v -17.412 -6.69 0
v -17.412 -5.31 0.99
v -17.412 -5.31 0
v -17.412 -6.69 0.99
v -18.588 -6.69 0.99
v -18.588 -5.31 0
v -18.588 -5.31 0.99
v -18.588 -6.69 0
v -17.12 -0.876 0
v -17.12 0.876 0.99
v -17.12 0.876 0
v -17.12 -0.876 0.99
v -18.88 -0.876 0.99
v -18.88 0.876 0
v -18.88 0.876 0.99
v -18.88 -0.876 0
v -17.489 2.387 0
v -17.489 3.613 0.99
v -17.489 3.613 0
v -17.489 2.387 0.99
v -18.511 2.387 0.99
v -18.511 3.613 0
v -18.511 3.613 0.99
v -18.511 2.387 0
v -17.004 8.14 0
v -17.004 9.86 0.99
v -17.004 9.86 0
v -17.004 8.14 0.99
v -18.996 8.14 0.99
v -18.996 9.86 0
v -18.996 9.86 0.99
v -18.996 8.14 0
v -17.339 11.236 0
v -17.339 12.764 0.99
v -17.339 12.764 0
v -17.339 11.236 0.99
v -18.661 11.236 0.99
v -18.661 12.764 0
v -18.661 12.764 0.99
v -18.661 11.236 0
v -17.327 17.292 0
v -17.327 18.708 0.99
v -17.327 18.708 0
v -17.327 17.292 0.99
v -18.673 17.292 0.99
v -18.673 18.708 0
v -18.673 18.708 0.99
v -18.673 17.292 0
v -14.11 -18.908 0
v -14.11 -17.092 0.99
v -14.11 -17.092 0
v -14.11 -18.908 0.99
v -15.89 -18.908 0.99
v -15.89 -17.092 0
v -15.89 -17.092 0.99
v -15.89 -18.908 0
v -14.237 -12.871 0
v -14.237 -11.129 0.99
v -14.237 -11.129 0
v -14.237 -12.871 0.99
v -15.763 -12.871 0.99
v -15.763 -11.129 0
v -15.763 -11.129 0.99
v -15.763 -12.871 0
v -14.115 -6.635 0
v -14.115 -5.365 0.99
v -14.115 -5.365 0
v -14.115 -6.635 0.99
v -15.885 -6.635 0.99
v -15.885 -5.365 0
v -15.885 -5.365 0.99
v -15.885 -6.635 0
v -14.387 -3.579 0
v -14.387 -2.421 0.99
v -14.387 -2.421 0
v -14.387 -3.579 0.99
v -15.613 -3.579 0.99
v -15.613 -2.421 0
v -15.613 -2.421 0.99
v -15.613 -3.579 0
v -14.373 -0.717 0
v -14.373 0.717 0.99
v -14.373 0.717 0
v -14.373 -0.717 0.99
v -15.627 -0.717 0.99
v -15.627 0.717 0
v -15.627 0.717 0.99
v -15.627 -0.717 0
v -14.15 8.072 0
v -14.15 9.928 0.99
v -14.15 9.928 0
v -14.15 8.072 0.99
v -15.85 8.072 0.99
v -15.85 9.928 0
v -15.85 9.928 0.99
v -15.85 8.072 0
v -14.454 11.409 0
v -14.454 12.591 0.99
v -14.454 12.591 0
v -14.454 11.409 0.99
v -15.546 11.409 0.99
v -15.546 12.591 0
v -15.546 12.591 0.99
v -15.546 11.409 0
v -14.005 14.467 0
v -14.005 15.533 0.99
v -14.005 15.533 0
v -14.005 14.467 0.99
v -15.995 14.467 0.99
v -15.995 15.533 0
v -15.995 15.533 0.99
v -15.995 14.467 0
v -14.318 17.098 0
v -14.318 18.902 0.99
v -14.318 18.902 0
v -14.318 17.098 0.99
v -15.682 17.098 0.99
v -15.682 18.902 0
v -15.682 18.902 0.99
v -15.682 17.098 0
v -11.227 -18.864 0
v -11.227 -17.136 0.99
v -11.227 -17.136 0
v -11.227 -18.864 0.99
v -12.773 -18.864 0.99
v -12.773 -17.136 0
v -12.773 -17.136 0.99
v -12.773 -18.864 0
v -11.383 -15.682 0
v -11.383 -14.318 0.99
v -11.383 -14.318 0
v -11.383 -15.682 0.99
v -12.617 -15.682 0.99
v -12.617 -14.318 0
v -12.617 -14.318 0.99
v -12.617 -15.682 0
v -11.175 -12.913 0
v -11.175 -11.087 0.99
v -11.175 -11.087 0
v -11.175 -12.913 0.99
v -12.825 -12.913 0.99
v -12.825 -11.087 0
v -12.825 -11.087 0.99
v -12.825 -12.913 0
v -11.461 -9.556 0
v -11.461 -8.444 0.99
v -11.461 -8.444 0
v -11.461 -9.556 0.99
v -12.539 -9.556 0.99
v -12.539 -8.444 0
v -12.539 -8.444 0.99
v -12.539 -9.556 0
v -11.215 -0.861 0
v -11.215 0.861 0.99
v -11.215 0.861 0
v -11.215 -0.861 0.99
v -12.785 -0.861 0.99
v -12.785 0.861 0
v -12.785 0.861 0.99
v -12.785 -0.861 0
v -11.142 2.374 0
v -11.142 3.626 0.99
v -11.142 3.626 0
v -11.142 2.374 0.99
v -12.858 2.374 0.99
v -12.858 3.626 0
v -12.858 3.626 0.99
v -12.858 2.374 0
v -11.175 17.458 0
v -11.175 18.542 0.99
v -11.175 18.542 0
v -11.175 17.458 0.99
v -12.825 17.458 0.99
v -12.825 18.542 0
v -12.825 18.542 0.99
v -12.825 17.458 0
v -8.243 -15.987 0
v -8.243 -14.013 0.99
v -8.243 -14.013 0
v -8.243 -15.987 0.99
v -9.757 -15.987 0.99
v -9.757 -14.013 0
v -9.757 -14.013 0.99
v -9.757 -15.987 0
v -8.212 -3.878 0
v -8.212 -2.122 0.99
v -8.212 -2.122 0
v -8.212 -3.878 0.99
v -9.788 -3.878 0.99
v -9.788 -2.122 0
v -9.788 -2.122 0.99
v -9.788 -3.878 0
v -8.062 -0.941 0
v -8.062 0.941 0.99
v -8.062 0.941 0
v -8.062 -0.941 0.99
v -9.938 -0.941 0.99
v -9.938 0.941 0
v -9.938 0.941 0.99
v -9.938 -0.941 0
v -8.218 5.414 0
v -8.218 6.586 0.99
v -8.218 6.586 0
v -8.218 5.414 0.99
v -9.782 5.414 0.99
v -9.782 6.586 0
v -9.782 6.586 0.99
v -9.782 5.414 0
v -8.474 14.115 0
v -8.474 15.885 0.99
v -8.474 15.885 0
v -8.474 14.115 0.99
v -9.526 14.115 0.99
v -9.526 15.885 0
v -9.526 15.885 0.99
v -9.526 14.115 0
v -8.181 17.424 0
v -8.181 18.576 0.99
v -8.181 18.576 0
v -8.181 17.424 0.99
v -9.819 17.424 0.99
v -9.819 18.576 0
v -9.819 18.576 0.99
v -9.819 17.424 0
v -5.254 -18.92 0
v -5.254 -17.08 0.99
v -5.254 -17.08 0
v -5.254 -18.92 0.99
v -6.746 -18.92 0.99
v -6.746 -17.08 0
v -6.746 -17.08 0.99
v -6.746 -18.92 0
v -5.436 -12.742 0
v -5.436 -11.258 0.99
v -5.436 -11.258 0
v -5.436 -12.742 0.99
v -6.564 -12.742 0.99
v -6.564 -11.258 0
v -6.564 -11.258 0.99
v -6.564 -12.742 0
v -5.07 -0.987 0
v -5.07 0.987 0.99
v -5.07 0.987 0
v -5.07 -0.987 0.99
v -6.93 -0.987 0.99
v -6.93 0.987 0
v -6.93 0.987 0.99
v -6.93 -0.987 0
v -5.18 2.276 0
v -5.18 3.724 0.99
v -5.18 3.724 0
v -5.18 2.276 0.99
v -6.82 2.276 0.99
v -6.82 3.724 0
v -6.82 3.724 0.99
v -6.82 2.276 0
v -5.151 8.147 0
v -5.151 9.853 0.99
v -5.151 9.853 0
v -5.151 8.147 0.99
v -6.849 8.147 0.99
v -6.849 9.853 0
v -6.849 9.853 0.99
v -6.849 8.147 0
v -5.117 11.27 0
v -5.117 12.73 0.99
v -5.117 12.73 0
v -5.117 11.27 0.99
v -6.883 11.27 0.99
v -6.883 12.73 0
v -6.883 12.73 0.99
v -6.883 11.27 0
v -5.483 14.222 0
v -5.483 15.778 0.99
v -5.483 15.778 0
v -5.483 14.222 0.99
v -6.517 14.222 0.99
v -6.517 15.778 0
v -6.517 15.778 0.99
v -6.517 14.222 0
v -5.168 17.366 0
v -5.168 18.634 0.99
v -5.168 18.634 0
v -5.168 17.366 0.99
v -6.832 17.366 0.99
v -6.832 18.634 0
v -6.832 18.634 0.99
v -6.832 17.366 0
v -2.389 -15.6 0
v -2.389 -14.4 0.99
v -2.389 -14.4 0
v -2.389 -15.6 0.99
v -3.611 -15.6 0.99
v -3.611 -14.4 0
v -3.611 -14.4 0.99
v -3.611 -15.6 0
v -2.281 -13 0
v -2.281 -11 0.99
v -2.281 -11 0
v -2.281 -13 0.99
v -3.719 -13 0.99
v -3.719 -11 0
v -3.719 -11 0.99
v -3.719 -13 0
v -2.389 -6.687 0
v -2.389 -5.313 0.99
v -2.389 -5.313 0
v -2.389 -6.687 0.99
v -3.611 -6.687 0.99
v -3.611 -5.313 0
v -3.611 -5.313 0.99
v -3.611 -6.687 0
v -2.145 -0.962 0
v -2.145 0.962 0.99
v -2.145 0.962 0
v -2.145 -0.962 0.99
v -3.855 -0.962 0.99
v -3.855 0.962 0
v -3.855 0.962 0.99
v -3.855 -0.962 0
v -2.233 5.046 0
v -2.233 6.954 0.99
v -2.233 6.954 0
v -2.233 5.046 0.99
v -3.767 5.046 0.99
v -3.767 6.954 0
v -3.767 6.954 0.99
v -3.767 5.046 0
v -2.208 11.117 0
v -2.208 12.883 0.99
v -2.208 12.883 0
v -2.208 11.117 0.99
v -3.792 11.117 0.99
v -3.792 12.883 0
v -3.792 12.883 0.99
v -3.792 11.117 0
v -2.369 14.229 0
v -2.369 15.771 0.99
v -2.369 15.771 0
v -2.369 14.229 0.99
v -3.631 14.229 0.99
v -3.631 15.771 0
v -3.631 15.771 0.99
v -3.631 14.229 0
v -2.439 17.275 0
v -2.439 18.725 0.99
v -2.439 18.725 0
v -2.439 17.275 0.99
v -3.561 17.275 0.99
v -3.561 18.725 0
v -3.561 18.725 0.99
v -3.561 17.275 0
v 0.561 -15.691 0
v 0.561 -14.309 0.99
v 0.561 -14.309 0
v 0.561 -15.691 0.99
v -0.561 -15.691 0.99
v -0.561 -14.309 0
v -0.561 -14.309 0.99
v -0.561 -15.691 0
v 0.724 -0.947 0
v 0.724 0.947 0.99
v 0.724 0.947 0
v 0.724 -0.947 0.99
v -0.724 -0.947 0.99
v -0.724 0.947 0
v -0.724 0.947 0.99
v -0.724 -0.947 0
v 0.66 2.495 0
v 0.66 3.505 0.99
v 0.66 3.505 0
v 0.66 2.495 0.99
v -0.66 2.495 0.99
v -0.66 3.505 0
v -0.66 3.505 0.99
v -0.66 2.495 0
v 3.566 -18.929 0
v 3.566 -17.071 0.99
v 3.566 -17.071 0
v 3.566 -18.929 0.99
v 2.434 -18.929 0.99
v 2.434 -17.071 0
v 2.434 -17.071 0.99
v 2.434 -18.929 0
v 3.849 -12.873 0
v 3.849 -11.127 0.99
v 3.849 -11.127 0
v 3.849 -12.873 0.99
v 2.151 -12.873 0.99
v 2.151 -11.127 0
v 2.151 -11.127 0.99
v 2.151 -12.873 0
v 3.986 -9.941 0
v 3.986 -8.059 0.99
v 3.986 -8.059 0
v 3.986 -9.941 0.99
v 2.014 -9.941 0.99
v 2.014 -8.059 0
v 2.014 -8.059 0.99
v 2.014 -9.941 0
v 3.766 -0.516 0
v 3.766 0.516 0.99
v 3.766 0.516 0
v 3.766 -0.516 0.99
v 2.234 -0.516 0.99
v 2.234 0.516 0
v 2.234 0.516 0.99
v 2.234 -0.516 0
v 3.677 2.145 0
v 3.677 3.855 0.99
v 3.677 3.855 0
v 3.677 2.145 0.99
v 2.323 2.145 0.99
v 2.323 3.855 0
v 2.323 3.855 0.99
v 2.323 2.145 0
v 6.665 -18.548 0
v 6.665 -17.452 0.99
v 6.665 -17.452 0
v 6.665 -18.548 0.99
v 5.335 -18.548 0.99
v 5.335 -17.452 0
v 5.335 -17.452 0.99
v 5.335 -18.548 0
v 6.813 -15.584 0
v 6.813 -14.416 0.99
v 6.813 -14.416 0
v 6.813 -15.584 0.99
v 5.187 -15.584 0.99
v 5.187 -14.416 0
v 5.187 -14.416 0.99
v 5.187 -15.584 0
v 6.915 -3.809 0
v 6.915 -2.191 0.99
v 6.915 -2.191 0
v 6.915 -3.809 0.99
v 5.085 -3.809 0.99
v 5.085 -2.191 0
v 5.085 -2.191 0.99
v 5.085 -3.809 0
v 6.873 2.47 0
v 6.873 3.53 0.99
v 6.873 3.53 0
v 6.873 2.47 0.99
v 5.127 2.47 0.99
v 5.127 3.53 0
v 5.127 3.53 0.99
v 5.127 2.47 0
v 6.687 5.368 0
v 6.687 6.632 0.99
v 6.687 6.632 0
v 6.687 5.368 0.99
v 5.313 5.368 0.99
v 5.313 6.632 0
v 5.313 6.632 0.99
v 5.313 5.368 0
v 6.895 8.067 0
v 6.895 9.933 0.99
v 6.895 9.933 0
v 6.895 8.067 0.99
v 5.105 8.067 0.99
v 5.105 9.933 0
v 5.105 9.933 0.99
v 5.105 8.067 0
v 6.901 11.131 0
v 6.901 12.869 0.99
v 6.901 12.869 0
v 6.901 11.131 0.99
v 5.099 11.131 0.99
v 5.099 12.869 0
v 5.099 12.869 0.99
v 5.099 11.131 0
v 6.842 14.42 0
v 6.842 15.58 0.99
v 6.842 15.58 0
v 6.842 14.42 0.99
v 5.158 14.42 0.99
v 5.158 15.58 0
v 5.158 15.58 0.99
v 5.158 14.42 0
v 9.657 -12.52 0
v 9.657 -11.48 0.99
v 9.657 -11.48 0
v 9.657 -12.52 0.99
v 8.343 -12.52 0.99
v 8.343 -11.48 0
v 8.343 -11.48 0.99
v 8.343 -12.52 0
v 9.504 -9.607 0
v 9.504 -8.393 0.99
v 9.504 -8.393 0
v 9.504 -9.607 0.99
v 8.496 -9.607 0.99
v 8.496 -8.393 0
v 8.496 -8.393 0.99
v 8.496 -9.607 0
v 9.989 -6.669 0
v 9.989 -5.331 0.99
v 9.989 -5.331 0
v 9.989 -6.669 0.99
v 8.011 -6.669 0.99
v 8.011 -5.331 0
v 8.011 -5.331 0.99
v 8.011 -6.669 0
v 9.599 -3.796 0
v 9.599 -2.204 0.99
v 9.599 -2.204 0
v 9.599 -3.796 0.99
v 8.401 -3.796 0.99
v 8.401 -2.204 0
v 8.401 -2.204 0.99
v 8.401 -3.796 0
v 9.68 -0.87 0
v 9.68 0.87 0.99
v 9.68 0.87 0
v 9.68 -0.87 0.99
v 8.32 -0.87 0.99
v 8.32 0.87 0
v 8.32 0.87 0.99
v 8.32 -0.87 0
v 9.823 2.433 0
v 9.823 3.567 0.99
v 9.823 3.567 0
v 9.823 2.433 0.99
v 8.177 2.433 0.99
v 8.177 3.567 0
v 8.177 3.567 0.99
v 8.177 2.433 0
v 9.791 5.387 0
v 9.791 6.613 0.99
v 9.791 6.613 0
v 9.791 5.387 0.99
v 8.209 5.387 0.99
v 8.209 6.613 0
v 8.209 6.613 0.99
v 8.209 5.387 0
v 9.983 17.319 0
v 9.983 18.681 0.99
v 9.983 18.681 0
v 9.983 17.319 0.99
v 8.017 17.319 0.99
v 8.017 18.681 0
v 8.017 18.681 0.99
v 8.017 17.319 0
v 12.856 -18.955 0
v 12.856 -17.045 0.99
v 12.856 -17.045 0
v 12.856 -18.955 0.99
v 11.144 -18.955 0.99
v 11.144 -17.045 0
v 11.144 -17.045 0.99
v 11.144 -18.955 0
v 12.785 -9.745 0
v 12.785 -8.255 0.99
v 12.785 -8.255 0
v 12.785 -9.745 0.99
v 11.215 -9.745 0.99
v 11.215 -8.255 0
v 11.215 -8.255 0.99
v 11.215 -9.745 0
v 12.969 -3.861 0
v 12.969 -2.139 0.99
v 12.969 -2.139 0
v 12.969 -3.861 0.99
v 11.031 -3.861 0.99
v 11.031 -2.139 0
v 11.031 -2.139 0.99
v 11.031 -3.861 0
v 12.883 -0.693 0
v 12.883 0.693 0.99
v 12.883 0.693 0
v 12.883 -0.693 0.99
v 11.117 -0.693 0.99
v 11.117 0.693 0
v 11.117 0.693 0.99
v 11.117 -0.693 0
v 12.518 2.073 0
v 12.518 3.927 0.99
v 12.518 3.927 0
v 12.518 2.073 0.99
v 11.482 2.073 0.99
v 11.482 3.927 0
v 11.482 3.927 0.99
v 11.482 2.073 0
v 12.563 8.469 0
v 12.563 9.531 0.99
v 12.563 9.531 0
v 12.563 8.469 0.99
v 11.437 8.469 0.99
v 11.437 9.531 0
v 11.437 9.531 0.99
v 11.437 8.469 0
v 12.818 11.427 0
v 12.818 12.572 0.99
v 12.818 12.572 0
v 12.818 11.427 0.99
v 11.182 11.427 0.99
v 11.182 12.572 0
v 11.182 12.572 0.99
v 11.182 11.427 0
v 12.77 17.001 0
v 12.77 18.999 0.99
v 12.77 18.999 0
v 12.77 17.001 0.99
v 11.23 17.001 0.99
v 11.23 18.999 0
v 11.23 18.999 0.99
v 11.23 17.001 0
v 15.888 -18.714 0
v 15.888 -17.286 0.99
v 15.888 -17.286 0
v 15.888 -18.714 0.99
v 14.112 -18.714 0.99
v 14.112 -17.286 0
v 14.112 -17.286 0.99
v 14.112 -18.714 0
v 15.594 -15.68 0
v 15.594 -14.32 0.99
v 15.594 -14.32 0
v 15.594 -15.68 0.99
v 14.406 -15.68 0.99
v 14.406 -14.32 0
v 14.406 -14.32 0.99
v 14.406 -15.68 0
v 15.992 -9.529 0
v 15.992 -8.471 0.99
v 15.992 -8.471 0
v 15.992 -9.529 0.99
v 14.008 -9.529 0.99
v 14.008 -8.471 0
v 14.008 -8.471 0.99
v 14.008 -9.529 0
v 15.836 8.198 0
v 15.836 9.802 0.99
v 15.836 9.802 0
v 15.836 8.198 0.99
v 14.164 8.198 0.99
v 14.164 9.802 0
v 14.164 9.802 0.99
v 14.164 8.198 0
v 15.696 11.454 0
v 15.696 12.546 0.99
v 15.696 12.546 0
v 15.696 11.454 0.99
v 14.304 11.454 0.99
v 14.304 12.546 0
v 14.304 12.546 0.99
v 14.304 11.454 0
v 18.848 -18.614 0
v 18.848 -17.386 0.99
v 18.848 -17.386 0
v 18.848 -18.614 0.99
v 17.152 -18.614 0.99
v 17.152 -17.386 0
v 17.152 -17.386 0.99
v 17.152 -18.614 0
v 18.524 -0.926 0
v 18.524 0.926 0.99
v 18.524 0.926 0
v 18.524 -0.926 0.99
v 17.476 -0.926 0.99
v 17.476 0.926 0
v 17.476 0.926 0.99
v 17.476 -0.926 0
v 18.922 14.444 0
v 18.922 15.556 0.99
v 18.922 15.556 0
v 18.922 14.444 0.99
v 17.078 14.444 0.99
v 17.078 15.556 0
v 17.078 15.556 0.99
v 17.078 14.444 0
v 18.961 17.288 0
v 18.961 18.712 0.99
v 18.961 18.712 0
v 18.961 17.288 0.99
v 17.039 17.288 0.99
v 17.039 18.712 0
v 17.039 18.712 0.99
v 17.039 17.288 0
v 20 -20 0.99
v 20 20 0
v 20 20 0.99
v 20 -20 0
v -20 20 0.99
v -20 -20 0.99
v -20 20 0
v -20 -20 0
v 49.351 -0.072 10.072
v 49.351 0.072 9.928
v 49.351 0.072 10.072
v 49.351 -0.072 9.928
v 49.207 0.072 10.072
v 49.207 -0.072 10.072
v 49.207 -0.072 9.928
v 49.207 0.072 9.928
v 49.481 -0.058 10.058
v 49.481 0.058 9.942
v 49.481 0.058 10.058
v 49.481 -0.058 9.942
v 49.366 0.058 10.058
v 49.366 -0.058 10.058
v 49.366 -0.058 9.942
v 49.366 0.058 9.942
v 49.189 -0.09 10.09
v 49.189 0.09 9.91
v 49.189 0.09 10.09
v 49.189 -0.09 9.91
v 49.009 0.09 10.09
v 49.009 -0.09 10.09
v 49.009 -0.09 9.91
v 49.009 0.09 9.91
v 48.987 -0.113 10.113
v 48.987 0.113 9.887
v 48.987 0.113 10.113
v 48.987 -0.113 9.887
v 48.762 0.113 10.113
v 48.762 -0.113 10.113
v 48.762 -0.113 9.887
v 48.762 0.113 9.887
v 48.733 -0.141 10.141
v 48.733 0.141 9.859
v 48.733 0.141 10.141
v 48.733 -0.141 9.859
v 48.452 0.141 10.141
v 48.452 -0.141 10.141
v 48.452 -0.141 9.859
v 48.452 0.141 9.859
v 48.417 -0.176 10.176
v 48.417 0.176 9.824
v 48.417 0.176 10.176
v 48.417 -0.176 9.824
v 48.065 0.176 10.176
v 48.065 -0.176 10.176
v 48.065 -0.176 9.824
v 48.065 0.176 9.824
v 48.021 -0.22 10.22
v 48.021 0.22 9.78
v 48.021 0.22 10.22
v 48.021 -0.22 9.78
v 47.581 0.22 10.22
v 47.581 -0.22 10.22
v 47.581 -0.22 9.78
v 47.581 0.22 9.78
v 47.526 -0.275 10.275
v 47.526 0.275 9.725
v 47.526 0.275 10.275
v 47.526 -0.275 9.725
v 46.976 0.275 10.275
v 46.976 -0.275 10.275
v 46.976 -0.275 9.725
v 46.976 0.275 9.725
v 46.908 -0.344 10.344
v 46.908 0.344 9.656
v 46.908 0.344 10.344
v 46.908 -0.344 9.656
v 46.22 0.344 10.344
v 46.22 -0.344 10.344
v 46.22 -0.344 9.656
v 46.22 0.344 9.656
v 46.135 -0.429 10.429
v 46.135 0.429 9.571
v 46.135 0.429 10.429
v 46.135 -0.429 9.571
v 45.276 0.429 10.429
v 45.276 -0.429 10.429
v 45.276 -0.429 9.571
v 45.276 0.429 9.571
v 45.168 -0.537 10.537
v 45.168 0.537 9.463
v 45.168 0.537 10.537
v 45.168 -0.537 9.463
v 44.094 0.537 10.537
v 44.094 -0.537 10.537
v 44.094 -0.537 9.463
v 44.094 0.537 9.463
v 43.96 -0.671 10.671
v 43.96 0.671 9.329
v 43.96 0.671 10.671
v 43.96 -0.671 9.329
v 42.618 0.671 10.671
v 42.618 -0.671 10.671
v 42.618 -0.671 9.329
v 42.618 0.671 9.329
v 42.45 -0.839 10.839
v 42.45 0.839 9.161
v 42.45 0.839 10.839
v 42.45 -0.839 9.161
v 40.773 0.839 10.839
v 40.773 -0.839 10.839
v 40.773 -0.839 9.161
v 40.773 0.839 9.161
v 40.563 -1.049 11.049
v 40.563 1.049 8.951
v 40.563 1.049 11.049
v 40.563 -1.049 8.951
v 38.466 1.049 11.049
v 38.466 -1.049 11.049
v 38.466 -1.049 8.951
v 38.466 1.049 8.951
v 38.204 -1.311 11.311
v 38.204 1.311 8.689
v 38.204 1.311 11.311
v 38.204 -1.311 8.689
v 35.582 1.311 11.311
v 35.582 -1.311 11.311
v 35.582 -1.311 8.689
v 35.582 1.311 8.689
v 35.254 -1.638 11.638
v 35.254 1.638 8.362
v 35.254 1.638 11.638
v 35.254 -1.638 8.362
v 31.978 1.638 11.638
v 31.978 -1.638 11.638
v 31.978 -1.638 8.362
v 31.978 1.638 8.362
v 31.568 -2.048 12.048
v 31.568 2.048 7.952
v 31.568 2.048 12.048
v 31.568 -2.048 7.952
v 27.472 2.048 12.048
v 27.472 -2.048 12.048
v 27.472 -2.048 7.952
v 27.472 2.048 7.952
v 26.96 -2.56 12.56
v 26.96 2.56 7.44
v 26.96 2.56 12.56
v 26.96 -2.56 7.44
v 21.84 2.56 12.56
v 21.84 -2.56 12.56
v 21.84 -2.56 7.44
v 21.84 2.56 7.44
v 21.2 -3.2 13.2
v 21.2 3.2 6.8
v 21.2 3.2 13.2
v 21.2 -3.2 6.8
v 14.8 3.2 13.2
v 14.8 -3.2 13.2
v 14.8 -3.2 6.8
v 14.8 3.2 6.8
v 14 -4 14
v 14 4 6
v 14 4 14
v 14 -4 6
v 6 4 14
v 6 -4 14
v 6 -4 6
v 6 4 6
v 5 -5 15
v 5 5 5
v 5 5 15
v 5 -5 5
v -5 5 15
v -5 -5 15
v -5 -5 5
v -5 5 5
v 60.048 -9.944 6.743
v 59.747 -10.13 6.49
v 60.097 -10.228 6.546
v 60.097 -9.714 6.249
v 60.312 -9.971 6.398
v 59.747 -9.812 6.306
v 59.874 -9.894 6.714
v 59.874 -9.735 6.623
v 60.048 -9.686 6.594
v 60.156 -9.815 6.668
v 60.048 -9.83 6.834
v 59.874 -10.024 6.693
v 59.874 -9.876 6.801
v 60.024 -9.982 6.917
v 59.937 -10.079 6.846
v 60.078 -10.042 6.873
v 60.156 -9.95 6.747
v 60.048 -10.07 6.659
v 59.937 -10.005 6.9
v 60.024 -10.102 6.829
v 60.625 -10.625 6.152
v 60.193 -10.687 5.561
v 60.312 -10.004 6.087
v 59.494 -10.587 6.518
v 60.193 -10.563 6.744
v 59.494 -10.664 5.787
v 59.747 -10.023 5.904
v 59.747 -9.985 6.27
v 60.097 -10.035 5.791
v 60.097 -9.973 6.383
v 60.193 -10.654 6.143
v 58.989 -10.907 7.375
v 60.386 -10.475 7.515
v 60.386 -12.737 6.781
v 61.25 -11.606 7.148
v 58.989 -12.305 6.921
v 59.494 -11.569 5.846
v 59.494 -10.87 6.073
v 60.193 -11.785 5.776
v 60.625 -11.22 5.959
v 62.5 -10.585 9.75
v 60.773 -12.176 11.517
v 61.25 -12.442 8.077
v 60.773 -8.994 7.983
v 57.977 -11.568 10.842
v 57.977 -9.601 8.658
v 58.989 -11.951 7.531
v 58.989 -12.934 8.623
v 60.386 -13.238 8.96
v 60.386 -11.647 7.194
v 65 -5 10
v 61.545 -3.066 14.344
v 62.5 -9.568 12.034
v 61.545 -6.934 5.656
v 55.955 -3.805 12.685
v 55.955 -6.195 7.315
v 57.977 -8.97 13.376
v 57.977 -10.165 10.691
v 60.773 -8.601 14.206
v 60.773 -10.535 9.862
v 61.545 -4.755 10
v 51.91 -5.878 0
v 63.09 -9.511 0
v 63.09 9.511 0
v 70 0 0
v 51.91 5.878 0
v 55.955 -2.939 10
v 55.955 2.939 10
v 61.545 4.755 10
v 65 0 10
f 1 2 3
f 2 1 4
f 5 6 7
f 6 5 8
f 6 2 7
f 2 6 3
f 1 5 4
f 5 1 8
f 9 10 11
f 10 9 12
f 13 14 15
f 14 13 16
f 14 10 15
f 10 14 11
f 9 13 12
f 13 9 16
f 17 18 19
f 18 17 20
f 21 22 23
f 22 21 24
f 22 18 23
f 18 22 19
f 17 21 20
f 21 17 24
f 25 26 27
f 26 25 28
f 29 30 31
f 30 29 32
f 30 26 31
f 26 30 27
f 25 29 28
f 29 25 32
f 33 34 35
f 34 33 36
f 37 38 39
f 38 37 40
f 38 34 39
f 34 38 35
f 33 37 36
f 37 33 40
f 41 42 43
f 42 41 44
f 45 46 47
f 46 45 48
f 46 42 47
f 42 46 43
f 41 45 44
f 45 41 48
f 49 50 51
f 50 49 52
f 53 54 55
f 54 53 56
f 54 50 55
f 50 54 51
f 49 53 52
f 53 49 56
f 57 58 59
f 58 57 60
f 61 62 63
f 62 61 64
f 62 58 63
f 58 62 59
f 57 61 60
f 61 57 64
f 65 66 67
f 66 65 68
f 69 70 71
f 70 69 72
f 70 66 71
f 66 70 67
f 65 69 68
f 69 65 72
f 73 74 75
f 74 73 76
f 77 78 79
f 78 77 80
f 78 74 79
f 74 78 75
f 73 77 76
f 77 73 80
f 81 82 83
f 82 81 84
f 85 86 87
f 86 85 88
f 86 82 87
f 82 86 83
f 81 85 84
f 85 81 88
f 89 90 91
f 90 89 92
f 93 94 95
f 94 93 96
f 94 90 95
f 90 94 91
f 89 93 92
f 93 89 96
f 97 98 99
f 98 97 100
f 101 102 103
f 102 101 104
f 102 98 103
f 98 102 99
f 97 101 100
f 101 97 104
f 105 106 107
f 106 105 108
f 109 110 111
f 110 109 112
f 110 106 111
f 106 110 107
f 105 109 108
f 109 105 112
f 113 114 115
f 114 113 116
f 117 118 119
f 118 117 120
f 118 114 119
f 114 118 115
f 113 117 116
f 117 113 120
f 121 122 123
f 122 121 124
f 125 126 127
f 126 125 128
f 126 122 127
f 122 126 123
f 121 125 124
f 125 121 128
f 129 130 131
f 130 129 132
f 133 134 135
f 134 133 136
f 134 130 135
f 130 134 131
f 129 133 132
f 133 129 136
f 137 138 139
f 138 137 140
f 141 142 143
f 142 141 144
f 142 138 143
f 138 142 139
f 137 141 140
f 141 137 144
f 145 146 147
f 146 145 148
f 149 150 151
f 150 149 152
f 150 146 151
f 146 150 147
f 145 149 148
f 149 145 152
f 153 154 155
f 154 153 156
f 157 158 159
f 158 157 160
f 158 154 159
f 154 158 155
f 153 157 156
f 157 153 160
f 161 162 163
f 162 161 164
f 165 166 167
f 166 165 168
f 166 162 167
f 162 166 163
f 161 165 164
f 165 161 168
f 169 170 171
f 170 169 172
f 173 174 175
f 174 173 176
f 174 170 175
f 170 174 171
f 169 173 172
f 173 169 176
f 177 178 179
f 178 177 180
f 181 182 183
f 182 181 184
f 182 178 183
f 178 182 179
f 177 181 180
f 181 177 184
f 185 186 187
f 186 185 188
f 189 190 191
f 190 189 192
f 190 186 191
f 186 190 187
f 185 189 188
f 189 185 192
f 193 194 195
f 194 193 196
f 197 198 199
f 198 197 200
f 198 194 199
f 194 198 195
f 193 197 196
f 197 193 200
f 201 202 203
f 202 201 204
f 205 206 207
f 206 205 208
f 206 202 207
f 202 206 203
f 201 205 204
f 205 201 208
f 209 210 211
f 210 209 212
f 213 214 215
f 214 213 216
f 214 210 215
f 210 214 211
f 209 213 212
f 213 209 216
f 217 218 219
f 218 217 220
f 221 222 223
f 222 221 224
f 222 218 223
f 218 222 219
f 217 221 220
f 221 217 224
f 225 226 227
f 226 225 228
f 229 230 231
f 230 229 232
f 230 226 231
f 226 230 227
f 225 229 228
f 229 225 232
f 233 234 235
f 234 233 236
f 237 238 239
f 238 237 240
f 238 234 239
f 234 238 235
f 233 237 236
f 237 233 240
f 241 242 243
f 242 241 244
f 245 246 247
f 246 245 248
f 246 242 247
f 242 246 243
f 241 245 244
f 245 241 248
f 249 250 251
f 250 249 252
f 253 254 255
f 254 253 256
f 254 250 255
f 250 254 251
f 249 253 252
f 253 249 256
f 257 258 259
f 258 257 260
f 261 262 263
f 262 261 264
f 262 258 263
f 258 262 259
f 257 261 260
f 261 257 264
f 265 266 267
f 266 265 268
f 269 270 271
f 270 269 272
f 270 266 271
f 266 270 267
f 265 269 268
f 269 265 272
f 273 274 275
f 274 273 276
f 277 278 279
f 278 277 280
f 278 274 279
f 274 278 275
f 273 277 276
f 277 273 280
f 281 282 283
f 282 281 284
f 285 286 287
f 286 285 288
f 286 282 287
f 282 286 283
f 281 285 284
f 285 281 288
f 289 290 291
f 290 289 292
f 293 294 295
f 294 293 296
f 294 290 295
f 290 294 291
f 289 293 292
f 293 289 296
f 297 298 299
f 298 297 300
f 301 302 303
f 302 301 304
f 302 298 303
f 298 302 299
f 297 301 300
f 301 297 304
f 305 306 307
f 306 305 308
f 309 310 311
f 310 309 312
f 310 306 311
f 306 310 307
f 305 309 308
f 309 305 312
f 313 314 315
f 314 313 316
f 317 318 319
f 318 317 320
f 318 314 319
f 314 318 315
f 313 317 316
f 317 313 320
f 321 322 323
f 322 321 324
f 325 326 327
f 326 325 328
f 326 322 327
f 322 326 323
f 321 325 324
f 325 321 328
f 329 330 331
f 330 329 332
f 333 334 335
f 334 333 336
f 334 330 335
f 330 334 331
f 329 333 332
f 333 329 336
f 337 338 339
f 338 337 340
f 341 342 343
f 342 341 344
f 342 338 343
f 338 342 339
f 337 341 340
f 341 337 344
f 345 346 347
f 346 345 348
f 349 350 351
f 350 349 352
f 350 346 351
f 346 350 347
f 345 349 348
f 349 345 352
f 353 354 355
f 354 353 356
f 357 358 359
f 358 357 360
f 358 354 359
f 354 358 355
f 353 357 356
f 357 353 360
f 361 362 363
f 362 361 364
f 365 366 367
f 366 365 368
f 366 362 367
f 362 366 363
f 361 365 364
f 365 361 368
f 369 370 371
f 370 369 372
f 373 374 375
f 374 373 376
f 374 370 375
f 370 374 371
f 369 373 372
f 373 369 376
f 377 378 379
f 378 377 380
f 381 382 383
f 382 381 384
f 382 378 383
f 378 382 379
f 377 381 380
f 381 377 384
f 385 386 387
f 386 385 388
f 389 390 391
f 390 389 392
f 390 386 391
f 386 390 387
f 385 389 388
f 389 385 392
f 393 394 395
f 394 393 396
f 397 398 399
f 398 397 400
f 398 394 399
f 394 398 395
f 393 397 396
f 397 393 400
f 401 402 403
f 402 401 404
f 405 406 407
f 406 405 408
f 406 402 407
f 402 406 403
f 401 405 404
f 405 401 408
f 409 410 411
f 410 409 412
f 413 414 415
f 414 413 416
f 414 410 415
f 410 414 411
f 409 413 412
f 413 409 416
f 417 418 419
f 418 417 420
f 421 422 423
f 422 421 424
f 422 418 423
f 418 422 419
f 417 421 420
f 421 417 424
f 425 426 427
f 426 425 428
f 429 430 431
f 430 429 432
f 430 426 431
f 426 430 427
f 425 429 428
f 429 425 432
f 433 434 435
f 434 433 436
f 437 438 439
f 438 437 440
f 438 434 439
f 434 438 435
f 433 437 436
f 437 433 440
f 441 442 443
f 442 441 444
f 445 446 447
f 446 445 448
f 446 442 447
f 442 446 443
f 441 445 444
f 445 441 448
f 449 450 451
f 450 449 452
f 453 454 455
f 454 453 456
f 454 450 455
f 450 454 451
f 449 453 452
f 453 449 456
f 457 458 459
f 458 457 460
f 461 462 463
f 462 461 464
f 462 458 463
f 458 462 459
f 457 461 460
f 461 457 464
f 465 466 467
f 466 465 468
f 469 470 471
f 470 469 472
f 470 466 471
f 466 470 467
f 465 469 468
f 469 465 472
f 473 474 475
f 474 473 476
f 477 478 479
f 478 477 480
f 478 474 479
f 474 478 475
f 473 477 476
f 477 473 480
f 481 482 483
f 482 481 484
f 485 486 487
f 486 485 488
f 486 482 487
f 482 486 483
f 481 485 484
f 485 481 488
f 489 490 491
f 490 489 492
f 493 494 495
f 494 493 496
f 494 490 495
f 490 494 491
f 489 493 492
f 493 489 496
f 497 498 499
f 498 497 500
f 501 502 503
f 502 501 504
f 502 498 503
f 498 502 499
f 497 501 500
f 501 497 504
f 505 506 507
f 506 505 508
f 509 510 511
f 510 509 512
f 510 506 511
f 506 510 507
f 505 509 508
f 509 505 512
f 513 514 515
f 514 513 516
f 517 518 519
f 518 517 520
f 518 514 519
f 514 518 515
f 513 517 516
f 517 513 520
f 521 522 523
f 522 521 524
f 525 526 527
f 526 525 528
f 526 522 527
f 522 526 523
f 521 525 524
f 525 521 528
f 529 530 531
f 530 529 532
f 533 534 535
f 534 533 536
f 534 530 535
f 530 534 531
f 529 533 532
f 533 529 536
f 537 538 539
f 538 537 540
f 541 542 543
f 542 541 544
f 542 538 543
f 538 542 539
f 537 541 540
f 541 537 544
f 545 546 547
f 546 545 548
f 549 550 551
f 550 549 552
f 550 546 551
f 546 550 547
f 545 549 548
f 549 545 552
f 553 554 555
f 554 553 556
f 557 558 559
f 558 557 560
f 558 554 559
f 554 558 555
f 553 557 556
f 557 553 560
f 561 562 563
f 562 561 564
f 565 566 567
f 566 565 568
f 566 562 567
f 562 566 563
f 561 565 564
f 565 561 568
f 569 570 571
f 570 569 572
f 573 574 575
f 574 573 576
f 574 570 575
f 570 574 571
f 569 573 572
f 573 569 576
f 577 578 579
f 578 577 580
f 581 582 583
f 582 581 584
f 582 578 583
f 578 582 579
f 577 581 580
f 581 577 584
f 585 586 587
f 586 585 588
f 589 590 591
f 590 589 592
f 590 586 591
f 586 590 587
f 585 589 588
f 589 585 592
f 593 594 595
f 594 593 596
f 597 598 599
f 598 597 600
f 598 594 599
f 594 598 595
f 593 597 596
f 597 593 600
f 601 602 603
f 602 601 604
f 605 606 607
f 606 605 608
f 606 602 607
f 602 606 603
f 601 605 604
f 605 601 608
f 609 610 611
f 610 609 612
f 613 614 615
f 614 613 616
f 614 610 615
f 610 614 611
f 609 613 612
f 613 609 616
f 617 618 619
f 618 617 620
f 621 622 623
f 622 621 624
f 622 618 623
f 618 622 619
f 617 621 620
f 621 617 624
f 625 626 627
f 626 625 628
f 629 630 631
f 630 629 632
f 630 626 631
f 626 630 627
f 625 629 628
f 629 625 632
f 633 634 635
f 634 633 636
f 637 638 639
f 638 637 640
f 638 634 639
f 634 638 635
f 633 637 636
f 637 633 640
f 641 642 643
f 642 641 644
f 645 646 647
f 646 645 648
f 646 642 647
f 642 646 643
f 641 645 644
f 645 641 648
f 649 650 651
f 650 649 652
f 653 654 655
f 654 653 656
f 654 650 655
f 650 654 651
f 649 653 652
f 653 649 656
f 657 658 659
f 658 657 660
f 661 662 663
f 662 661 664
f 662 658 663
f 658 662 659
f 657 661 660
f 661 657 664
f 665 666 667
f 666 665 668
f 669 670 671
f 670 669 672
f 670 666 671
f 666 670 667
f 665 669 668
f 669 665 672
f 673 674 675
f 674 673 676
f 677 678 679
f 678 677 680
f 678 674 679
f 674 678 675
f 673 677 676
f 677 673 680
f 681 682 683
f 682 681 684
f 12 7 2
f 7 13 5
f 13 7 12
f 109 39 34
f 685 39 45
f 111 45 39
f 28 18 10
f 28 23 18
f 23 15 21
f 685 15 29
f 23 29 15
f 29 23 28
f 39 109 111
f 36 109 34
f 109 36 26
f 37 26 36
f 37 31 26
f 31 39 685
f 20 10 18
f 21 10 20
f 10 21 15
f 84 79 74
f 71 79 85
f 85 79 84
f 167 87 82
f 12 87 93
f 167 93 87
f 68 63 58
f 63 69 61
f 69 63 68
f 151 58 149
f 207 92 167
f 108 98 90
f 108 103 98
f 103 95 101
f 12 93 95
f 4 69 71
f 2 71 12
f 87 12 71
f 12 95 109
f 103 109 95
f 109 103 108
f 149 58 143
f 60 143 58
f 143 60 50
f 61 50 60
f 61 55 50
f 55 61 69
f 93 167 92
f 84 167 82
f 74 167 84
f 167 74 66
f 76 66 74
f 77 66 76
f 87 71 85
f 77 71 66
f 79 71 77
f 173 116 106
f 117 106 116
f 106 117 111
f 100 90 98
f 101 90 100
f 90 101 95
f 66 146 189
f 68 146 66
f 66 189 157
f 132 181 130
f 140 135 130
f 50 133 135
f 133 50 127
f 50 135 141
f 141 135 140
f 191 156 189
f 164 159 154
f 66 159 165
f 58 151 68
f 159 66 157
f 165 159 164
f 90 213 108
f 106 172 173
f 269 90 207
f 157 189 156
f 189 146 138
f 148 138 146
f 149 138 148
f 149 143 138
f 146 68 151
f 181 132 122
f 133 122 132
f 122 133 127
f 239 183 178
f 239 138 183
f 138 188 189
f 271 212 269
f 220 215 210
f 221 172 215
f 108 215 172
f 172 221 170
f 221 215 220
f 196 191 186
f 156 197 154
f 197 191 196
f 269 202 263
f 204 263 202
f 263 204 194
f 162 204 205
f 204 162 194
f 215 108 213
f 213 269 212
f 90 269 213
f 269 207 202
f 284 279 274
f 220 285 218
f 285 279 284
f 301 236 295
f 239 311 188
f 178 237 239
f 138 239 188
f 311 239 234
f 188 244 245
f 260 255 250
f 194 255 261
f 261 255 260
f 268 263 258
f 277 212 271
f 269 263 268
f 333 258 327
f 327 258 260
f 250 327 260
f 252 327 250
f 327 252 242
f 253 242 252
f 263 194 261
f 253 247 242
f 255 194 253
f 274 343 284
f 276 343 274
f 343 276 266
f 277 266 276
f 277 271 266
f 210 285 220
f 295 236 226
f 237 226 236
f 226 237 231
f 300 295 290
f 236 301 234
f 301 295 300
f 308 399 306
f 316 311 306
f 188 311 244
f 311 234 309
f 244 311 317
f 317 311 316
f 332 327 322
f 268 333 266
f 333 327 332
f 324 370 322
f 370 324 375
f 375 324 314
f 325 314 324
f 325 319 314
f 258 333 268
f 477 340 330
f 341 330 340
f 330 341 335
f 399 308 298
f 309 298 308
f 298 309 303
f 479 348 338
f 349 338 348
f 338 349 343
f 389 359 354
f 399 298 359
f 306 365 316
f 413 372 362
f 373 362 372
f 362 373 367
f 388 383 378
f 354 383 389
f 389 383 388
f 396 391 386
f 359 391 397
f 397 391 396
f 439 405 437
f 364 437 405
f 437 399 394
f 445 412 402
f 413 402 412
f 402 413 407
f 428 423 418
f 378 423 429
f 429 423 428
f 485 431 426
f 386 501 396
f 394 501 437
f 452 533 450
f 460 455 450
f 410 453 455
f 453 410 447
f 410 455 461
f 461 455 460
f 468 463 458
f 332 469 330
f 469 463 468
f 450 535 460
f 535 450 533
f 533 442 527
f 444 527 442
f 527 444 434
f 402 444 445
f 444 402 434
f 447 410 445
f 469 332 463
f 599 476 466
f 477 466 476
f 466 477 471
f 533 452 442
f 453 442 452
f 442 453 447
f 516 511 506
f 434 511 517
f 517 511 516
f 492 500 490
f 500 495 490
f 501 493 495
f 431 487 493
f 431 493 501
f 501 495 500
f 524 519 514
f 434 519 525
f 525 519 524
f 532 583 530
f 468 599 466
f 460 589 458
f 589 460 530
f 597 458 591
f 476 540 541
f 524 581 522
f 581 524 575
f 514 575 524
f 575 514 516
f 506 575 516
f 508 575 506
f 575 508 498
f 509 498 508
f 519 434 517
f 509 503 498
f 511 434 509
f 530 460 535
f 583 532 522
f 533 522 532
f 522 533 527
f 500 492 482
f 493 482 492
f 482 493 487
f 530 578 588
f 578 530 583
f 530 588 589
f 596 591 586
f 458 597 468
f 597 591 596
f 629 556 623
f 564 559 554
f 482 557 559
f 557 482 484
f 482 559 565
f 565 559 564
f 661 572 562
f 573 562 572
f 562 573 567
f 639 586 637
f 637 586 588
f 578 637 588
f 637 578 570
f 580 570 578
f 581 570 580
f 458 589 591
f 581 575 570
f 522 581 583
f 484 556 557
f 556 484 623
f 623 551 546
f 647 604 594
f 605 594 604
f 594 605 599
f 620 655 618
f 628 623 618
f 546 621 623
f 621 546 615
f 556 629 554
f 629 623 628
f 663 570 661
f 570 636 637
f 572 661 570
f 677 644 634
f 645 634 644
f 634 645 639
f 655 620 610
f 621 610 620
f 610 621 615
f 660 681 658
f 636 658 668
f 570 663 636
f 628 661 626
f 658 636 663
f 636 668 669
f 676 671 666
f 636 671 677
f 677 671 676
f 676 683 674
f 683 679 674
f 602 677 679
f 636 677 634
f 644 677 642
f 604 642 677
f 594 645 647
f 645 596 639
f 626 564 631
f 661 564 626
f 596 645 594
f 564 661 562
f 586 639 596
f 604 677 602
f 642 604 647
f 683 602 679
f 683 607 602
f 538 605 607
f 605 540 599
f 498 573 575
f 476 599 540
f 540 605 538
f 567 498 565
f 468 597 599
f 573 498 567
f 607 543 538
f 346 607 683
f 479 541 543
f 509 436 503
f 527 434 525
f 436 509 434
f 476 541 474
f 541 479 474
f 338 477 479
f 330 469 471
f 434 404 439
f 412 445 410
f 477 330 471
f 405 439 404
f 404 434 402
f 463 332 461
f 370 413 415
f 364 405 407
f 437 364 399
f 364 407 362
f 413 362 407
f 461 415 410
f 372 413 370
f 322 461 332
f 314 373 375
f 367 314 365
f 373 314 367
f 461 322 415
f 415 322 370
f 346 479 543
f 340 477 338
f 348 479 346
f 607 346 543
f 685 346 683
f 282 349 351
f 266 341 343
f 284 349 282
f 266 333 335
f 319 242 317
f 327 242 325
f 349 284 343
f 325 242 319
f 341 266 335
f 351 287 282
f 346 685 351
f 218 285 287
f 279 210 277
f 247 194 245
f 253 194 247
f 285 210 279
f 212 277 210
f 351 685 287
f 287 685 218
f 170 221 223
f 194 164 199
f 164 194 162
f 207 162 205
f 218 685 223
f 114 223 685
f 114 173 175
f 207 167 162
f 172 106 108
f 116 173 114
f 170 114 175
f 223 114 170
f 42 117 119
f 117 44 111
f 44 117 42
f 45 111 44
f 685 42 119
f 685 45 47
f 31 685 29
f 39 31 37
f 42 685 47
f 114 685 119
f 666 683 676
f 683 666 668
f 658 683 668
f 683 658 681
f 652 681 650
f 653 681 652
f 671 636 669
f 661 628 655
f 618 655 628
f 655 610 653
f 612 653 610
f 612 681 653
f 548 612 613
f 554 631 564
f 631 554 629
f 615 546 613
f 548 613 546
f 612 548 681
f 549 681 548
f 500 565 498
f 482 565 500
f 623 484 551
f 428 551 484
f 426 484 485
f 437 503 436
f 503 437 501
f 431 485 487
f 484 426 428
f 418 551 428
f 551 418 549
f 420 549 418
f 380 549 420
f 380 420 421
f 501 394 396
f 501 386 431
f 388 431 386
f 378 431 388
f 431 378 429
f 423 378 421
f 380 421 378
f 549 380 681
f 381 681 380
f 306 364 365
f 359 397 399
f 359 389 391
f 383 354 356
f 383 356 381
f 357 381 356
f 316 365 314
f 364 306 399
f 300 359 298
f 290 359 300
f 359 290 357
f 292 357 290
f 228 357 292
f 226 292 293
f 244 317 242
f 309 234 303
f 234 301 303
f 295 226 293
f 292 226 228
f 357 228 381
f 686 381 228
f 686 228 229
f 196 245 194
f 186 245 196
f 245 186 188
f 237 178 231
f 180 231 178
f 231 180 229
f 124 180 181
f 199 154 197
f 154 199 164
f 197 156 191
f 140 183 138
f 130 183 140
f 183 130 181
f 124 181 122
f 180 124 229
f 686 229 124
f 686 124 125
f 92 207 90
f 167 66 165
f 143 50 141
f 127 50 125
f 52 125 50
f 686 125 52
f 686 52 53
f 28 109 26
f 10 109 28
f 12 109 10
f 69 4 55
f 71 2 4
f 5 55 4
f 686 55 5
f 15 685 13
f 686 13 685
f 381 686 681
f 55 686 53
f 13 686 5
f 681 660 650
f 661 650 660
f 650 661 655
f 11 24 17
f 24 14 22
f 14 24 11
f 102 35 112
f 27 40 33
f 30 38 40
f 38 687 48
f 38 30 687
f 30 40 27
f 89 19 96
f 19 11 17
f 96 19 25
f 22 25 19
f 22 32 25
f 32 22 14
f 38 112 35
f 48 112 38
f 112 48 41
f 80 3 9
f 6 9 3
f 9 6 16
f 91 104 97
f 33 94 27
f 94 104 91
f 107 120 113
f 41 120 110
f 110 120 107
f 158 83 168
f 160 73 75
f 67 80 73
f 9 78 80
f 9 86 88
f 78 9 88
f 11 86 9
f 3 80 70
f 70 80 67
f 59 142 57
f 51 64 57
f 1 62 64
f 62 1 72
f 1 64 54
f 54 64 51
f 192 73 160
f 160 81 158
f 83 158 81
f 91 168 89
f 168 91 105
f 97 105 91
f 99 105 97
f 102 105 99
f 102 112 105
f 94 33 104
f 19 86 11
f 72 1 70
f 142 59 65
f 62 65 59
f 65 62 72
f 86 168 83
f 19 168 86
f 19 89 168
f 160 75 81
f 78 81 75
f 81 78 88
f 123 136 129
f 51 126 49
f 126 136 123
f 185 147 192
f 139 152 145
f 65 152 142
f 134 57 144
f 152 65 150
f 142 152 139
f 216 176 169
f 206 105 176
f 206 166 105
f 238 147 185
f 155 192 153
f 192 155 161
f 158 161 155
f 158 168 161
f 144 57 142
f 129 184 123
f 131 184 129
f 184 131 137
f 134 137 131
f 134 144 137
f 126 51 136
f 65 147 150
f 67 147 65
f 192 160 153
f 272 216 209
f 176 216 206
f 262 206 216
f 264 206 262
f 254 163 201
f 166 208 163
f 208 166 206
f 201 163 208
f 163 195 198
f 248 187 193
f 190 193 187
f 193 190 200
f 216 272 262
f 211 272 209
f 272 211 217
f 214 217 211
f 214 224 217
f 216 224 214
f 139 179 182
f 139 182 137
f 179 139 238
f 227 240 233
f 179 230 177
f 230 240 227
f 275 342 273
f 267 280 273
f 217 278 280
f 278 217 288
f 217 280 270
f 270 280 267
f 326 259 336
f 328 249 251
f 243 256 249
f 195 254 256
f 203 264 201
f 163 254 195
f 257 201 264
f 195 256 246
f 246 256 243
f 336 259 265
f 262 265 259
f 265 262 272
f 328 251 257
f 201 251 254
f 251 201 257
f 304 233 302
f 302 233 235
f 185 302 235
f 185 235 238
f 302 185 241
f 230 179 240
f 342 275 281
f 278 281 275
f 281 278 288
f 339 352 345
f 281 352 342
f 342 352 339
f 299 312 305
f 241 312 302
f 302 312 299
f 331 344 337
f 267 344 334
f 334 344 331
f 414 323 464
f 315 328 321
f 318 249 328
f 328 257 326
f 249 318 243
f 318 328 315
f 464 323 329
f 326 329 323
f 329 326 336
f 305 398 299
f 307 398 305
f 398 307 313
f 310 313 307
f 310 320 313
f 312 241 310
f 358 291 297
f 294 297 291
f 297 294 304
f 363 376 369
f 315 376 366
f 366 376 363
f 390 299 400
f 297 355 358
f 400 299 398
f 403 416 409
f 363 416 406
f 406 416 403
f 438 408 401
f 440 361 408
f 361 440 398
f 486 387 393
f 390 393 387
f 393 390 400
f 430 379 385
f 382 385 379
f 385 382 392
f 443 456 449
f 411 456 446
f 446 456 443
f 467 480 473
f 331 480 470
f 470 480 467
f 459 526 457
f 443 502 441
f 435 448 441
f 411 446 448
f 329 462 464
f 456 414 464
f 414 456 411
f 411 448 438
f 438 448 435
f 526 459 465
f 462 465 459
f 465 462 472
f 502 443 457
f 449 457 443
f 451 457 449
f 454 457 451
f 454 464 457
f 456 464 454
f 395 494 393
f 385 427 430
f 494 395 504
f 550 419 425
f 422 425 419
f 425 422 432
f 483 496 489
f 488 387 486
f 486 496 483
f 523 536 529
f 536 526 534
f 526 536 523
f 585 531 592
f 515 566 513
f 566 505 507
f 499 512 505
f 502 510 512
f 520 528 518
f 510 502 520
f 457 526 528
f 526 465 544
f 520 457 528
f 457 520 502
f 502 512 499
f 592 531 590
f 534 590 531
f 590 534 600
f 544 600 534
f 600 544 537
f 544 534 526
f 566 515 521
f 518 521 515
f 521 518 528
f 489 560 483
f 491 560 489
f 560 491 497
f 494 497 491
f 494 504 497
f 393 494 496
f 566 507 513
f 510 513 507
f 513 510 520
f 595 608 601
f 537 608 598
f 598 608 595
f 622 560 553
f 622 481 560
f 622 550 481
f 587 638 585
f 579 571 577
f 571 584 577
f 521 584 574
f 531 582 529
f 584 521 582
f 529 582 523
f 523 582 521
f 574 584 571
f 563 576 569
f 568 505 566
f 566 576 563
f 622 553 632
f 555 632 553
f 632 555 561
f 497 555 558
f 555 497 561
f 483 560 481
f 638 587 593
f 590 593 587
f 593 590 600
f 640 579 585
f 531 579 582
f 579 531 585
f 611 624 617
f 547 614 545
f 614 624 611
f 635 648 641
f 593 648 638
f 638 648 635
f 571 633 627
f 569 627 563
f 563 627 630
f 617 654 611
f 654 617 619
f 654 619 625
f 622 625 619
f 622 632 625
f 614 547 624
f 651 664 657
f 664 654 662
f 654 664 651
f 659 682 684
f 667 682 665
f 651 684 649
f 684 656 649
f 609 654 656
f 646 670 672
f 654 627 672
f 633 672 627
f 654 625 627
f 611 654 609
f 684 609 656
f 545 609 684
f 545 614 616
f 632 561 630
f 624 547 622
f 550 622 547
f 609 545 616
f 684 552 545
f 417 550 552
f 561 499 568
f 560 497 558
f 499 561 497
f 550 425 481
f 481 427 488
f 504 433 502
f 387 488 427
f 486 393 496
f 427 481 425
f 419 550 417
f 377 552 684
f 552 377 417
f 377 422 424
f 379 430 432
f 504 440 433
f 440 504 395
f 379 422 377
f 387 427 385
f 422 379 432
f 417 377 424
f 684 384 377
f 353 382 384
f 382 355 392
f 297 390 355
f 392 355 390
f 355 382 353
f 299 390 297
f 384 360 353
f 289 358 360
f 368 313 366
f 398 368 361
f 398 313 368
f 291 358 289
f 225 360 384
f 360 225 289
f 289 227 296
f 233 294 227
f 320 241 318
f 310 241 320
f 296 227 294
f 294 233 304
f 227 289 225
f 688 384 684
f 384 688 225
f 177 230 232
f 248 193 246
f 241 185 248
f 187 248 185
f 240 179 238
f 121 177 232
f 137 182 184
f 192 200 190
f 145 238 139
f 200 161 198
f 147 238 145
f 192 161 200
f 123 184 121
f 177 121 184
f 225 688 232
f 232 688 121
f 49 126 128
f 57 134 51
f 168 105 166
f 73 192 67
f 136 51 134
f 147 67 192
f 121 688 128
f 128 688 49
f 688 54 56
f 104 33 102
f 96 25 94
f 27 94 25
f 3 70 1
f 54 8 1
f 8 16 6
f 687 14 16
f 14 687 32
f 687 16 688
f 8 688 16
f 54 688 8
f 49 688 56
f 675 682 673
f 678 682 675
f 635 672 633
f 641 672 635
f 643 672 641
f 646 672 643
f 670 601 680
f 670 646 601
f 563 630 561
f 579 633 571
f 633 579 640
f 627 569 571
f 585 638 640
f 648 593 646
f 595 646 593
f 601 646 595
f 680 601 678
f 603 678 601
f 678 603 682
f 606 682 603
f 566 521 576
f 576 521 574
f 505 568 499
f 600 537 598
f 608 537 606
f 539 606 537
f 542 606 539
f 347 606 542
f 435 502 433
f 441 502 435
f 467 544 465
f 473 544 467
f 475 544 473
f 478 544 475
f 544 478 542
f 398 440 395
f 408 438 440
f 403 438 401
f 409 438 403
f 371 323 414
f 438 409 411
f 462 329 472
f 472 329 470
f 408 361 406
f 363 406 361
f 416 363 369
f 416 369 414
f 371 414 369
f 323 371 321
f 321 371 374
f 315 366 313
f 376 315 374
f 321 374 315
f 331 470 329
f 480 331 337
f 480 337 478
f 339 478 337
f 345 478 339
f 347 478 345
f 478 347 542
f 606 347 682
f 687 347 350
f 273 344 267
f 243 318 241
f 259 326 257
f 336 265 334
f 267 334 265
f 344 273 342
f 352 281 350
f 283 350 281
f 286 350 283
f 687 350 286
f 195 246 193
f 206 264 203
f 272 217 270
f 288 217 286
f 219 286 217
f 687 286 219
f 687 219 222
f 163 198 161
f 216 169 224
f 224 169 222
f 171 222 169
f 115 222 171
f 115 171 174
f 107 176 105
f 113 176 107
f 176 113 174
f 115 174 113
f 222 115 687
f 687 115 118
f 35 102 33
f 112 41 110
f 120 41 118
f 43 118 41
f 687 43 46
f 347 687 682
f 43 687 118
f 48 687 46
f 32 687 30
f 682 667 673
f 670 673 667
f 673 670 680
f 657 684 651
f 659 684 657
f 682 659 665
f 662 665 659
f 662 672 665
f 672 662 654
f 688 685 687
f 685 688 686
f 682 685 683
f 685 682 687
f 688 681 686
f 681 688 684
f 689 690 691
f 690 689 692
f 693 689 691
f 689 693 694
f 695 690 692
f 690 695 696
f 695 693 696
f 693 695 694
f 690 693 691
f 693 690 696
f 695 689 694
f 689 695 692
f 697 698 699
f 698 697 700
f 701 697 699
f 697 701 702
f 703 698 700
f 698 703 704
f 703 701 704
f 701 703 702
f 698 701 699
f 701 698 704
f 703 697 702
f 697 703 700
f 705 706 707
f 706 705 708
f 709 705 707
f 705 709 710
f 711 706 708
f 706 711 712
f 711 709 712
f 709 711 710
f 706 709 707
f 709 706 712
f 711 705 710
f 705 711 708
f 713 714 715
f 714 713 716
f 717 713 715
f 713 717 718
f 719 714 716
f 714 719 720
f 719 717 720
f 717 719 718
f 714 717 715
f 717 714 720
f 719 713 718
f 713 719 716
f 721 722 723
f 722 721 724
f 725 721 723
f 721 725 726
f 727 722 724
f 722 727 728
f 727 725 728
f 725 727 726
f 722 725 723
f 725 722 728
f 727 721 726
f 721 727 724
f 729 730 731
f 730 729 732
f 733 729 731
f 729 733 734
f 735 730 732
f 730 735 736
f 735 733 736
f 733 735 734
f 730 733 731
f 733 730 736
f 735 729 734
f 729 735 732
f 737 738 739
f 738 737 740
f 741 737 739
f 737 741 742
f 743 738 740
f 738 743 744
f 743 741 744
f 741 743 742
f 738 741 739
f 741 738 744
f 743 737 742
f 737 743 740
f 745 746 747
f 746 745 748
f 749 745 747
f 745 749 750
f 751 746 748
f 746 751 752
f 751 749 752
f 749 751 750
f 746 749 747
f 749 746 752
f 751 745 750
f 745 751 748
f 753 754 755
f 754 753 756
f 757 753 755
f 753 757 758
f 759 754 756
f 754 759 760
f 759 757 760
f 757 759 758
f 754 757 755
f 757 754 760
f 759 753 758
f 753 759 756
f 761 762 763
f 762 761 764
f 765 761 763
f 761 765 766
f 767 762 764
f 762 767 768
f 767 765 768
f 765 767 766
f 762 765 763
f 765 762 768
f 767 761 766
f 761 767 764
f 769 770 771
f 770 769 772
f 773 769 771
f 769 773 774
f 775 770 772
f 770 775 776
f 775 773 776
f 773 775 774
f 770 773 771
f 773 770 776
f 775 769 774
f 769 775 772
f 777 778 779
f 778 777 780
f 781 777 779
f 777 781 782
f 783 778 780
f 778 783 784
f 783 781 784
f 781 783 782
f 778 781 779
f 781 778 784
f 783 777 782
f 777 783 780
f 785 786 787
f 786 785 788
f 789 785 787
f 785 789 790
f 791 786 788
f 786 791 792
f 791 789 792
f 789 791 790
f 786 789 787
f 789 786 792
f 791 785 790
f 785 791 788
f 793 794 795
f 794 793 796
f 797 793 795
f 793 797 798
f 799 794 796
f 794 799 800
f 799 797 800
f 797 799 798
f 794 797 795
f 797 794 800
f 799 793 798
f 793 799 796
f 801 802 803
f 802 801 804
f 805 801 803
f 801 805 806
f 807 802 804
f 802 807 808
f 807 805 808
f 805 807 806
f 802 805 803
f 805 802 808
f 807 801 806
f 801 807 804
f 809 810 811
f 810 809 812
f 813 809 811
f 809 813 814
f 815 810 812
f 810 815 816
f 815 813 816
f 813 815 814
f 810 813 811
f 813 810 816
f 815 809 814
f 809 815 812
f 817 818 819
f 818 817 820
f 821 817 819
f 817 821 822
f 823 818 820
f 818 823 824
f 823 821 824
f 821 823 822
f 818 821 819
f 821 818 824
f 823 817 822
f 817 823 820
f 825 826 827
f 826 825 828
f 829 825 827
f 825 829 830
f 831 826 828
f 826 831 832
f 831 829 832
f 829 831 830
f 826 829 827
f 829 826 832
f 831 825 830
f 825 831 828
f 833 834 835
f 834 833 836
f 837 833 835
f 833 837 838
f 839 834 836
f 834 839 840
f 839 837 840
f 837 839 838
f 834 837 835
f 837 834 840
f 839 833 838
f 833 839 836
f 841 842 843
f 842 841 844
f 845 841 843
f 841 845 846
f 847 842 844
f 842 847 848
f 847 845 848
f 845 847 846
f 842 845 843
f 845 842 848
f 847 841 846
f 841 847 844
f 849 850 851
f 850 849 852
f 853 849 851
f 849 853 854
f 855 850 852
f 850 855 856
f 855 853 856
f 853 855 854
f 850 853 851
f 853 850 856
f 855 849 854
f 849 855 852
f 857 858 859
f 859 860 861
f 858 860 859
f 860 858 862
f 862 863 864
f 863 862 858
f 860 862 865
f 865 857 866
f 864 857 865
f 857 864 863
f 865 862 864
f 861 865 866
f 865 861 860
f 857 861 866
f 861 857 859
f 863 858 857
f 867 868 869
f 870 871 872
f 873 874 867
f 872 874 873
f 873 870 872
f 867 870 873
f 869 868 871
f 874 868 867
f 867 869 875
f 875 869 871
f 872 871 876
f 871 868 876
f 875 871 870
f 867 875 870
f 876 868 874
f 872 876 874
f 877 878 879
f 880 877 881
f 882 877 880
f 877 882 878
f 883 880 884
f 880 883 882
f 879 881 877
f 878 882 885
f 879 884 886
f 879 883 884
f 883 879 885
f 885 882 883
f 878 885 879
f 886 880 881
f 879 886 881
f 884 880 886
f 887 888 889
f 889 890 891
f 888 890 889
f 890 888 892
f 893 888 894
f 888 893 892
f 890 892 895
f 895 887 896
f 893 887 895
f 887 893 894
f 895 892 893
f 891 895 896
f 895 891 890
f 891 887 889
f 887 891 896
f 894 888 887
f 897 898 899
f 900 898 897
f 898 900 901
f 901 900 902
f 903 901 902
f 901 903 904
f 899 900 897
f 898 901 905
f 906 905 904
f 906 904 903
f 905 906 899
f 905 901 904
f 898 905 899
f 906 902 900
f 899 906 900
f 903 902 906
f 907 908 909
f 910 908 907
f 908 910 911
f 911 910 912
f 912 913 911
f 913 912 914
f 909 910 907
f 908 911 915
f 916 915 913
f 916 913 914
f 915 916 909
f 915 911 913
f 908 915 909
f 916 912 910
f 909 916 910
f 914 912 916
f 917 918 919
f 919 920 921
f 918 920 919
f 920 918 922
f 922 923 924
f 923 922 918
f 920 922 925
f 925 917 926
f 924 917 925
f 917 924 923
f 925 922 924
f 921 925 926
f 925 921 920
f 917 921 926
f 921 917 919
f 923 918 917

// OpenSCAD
$fa = 1;
$fs = 0.4;

BASE_WIDTH = 40;
BASE_DEPTH = 40;

NUM_SPHERES = 100;
SPHERE_MIN_R = 1;
SPHERE_MAX_R = 2;

// generate randomly positioned spheres
xs = rands(1, 2, NUM_SPHERES);
ys = rands(1, 2, NUM_SPHERES);
zs = rands(1, 2, NUM_SPHERES);
rs = rands(SPHERE_MIN_R, SPHERE_MAX_R, NUM_SPHERES);
positions = [
    for(i = [0 : NUM_SPHERES-1])
        [rands(0.3, 3, 1)[0], rands(0.3, 3, 1)[0], 0]
];

difference() {
    translate([-BASE_WIDTH/2, -BASE_DEPTH/2, 0])
        cube([BASE_WIDTH, BASE_DEPTH, 1-0.01]);
    for(i = [-(BASE_WIDTH/2 - 2) : 3 : BASE_WIDTH/2 - 2]) {
        for(j = [-(BASE_DEPTH/2 - 2) : 3 : BASE_DEPTH/2 - 2]) {
            translate([i, j, -0.003])
                if (rands(0, 2, 1)[0] < 1)
                    square_cutout(rands(1, 2, 1)[0], rands(1, 2, 1)[0]);
        }
    }
}

// Returns distance between two 3D points
function distance(p0, p1) =
    sqrt( (p1[0] - p0[0])^2 + (p1[1] - p0[1])^2 + (p1[2] - p0[2])^2 );

echo("distance: ", distance([0, 0, 0], [1, 1, 1]));

translate([0, 0, 10])
    recursive_cube(10);

translate([60, 0, 0])
    recursive_cylinder(10);

module tictac_cutout(width, length) {
    translate([-width/2, -length/2, 0]) {
        cube([width, length, 1]);
        translate([width, length/2, 0])
            cylinder(1, r=length/2);
        translate([0, length/2, 0])
            cylinder(1, r=length/2);
    }
}

module square_cutout(width, length) {
    translate([-width/2, -length/2, 0]) {
        cube([width, length, 1]);
    }
}

module recursive_cube(size) {
    if(size > 0.1) {
        cube(size, center=true);
        translate([size, 0, 0])
            recursive_cube(size*0.8);
    }
}

module recursive_cylinder(size) {
    $fs = 20;
    $fa = 0.1;
    if (size > 0.1) {
        cylinder(size, size, size/2);
        translate([0, -size/2, size])
            rotate([66, 0, 0])
            recursive_cylinder(size/2);
    }
}
